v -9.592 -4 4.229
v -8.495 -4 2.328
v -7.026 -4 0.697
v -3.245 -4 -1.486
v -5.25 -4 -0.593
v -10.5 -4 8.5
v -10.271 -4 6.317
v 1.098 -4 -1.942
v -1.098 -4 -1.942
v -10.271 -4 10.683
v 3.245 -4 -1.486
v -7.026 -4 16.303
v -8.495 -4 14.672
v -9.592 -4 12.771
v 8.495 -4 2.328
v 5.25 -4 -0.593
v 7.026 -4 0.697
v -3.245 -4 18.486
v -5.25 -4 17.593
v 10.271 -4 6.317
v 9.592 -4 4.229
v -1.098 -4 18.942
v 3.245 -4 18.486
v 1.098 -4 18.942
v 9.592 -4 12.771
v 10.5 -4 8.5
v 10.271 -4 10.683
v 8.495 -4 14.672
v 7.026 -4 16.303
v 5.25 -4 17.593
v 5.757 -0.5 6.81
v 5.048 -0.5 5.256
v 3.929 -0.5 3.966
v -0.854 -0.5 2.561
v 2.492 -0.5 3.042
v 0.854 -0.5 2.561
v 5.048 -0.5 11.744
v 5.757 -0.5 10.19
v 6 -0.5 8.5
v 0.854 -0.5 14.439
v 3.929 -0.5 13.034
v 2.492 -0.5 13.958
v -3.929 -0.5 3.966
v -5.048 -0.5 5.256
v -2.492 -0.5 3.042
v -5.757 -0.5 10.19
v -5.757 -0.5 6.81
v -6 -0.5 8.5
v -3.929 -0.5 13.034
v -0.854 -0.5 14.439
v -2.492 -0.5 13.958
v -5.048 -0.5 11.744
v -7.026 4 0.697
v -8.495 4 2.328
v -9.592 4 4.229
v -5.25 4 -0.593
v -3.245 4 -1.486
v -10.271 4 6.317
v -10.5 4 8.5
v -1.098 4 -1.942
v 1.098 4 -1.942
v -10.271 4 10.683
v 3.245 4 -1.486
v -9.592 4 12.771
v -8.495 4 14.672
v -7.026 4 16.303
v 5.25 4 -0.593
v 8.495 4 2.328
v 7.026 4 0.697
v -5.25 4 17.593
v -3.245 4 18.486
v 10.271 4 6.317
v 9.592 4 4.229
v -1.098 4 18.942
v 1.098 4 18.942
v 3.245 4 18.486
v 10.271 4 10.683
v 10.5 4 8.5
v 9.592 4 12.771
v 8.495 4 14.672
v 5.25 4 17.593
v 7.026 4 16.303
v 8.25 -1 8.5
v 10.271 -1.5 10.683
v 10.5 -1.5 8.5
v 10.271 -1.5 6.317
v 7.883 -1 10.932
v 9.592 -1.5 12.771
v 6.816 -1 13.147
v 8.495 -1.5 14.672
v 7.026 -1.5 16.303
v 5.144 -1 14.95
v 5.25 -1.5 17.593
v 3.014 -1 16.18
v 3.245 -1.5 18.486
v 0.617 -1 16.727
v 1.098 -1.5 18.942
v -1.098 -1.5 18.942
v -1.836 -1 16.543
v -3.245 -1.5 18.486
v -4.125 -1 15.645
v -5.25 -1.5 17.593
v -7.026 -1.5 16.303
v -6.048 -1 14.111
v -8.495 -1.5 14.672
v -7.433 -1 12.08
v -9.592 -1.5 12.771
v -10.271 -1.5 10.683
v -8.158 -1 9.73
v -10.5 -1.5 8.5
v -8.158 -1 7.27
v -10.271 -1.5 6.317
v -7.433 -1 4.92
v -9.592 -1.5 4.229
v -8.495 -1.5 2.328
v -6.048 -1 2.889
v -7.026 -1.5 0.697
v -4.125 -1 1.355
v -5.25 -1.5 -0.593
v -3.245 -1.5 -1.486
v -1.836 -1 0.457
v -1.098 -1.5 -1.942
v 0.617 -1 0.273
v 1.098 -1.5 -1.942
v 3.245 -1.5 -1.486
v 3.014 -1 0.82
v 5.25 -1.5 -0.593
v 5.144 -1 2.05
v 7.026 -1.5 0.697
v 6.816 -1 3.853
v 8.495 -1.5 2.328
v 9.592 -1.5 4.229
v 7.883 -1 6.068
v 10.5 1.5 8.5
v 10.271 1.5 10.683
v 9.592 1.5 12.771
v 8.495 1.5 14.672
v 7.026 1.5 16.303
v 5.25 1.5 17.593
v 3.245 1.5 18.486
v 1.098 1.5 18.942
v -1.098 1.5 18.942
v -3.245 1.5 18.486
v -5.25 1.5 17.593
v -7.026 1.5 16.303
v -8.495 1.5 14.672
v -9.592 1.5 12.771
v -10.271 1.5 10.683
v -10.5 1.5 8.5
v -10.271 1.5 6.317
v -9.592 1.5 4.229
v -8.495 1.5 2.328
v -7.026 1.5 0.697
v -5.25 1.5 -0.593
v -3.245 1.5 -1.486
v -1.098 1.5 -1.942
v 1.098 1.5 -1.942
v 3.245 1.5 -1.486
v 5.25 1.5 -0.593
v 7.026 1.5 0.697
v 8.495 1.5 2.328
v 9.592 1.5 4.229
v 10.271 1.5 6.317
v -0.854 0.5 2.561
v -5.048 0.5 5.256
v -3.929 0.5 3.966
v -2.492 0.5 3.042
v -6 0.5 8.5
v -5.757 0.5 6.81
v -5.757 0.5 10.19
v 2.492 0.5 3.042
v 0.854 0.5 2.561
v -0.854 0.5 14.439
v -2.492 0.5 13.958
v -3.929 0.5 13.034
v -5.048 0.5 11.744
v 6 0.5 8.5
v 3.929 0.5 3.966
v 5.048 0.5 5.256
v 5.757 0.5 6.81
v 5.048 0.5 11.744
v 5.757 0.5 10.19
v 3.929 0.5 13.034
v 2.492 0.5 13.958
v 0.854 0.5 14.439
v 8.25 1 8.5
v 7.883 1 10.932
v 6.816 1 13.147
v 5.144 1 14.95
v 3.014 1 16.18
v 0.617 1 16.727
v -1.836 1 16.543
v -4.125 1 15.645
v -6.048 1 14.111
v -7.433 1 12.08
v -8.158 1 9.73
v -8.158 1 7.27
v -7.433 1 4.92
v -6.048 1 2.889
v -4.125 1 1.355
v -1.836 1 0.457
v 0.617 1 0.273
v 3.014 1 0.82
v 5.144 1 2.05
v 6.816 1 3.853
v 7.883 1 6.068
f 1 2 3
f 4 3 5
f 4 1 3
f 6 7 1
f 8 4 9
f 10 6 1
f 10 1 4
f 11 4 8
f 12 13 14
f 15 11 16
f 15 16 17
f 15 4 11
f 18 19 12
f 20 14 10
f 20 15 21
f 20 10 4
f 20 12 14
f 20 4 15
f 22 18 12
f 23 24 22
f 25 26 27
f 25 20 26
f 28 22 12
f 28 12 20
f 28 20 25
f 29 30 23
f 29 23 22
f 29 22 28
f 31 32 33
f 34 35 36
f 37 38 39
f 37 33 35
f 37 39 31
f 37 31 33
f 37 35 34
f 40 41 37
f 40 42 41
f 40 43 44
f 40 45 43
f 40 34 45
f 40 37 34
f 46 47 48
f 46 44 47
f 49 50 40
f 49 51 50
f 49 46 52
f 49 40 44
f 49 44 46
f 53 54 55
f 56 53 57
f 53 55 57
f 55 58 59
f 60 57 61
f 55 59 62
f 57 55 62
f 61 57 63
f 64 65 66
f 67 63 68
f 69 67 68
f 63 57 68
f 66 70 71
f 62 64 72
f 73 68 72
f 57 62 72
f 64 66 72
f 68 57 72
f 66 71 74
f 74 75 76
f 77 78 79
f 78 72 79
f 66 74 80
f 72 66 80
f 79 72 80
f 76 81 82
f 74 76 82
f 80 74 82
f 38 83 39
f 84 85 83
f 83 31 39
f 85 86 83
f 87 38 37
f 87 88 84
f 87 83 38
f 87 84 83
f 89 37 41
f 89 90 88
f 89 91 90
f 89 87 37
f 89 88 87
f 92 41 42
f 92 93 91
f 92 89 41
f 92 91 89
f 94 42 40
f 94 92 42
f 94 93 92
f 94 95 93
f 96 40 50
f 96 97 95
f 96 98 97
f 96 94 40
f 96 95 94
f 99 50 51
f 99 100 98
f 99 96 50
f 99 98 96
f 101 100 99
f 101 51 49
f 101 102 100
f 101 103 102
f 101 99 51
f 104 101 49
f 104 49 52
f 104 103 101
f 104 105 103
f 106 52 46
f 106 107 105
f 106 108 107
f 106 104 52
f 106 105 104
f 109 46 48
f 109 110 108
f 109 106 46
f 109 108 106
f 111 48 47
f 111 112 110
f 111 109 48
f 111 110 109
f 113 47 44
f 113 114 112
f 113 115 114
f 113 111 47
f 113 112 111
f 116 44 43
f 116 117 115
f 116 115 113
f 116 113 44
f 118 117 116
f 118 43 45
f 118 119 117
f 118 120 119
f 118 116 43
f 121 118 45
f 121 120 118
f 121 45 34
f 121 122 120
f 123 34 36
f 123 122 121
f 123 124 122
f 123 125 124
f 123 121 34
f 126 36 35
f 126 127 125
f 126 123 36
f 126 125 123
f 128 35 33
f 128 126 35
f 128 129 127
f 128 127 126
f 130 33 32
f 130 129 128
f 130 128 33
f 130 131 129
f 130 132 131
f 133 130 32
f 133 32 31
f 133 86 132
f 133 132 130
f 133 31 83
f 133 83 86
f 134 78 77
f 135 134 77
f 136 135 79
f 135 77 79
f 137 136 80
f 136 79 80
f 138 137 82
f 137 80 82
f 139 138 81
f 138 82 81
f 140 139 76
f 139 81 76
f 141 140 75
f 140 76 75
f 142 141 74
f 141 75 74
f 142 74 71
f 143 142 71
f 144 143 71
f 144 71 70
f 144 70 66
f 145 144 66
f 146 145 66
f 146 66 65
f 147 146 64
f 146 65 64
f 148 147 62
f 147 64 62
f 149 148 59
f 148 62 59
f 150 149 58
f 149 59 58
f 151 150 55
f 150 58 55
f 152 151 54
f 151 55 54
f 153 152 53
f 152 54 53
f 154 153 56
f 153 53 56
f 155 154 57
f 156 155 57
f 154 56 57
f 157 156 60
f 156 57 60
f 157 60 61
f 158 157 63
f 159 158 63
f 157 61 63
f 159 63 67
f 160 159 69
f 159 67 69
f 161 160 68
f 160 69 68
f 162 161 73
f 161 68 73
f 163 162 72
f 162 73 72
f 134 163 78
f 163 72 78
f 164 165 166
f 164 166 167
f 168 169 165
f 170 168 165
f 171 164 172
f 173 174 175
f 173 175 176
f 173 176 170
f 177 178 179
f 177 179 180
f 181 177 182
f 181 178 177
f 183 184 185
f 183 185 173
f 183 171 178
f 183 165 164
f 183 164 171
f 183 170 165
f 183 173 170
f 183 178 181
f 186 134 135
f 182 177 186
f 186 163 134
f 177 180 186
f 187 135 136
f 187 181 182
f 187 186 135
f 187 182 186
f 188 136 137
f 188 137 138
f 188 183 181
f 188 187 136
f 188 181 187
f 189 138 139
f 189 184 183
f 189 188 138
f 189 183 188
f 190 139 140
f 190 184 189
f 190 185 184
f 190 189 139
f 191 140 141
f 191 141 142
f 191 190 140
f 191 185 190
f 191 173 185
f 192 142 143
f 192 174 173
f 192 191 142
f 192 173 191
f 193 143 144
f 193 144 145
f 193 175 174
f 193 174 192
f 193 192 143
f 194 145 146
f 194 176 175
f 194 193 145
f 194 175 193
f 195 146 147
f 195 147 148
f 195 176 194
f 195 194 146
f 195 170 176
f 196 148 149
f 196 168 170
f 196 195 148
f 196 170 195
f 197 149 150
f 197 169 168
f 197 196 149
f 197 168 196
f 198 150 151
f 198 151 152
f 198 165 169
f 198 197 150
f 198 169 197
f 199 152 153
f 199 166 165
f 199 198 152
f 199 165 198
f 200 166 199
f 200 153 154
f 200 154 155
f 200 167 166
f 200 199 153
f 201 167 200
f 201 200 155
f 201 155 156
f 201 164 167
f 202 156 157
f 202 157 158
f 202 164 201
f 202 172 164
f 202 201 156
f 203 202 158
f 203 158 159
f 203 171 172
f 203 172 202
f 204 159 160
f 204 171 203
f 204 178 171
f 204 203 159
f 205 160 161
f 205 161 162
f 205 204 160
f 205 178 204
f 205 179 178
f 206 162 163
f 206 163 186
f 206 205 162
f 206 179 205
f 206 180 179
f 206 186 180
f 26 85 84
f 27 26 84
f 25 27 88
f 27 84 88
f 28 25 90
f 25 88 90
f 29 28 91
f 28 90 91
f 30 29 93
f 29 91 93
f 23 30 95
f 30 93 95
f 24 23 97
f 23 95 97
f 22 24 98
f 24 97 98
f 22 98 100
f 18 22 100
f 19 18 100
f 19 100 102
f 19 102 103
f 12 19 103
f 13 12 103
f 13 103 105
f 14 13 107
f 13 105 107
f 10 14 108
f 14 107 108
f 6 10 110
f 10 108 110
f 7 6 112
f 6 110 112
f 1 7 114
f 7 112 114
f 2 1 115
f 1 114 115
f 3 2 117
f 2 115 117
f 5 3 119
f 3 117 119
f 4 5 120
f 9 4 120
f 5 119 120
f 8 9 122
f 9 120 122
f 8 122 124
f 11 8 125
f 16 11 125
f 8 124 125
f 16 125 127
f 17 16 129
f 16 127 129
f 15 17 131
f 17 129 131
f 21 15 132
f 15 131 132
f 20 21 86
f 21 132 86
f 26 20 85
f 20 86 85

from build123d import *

# Parameters (mm, degrees)
CONE001_ROLL_ANGLE     = 90
CYLINDER006_R          = 10.5
CYLINDER006_DEPTH      = 2.5
CYLINDER006_ROLL_ANGLE = 90
CYLINDER005_R          = 10.5
CYLINDER005_DEPTH      = 2.5
CYLINDER005_ROLL_ANGLE = 90
CONE_ROLL_ANGLE        = 90


with BuildPart() as cone001:
    # Cone001 → Cone001 (revolve)
    with BuildSketch(Plane.XZ):
        Polygon((0, 0), (10.5, 0), (6, 1), (0, 1), align=None)
    revolve(axis=Axis((0, 0, 0), (0, 0, 1)))


with BuildPart() as cone001_1:
    # Cone001 roll: moved
    add(cone001.part.rotate(Axis((0, 0, 0), (1, 0, 0)), CONE001_ROLL_ANGLE))


with BuildPart() as cone001_2:
    # Cone001 placement: moved
    add(cone001_1.part.moved(Location((0, 1.5, 8.5))))


with BuildPart() as cylinder006:
    # Cylinder006 → Cylinder006 (new body)
    with BuildSketch(Plane.XY):
        Circle(CYLINDER006_R)
    extrude(amount=CYLINDER006_DEPTH)


with BuildPart() as cylinder006_1:
    # Cylinder006 roll: moved
    add(cylinder006.part.rotate(Axis((0, 0, 0), (1, 0, 0)), CYLINDER006_ROLL_ANGLE))


with BuildPart() as cylinder006_2:
    # Cylinder006 placement: moved
    add(cylinder006_1.part.moved(Location((0, 4, 8.5))))


with BuildPart() as cylinder005:
    # Cylinder005 → Cylinder005 (new body)
    with BuildSketch(Plane.XY):
        Circle(CYLINDER005_R)
    extrude(amount=CYLINDER005_DEPTH)


with BuildPart() as cylinder005_1:
    # Cylinder005 roll: moved
    add(cylinder005.part.rotate(Axis((0, 0, 0), (1, 0, 0)), CYLINDER005_ROLL_ANGLE))


with BuildPart() as cylinder005_2:
    # Cylinder005 placement: moved
    add(cylinder005_1.part.moved(Location((0, -1.5, 8.5))))


with BuildPart() as fusion005:
    # Cone → Cone (revolve)
    with BuildSketch(Plane.XZ):
        Polygon((0, 0), (6, 0), (10.5, 1), (0, 1), align=None)
    revolve(axis=Axis((0, 0, 0), (0, 0, 1)))


with BuildPart() as fusion005_1:
    # Cone roll: moved
    add(fusion005.part.rotate(Axis((0, 0, 0), (1, 0, 0)), CONE_ROLL_ANGLE))


with BuildPart() as fusion005_2:
    # Cone placement: moved
    add(fusion005_1.part.moved(Location((0, -0.5, 8.5))))

    # Fusion005: union Cone001, Cylinder006, Cylinder005
    add(cone001_2.part)
    add(cylinder006_2.part)
    add(cylinder005_2.part)


solid = fusion005_2.part
